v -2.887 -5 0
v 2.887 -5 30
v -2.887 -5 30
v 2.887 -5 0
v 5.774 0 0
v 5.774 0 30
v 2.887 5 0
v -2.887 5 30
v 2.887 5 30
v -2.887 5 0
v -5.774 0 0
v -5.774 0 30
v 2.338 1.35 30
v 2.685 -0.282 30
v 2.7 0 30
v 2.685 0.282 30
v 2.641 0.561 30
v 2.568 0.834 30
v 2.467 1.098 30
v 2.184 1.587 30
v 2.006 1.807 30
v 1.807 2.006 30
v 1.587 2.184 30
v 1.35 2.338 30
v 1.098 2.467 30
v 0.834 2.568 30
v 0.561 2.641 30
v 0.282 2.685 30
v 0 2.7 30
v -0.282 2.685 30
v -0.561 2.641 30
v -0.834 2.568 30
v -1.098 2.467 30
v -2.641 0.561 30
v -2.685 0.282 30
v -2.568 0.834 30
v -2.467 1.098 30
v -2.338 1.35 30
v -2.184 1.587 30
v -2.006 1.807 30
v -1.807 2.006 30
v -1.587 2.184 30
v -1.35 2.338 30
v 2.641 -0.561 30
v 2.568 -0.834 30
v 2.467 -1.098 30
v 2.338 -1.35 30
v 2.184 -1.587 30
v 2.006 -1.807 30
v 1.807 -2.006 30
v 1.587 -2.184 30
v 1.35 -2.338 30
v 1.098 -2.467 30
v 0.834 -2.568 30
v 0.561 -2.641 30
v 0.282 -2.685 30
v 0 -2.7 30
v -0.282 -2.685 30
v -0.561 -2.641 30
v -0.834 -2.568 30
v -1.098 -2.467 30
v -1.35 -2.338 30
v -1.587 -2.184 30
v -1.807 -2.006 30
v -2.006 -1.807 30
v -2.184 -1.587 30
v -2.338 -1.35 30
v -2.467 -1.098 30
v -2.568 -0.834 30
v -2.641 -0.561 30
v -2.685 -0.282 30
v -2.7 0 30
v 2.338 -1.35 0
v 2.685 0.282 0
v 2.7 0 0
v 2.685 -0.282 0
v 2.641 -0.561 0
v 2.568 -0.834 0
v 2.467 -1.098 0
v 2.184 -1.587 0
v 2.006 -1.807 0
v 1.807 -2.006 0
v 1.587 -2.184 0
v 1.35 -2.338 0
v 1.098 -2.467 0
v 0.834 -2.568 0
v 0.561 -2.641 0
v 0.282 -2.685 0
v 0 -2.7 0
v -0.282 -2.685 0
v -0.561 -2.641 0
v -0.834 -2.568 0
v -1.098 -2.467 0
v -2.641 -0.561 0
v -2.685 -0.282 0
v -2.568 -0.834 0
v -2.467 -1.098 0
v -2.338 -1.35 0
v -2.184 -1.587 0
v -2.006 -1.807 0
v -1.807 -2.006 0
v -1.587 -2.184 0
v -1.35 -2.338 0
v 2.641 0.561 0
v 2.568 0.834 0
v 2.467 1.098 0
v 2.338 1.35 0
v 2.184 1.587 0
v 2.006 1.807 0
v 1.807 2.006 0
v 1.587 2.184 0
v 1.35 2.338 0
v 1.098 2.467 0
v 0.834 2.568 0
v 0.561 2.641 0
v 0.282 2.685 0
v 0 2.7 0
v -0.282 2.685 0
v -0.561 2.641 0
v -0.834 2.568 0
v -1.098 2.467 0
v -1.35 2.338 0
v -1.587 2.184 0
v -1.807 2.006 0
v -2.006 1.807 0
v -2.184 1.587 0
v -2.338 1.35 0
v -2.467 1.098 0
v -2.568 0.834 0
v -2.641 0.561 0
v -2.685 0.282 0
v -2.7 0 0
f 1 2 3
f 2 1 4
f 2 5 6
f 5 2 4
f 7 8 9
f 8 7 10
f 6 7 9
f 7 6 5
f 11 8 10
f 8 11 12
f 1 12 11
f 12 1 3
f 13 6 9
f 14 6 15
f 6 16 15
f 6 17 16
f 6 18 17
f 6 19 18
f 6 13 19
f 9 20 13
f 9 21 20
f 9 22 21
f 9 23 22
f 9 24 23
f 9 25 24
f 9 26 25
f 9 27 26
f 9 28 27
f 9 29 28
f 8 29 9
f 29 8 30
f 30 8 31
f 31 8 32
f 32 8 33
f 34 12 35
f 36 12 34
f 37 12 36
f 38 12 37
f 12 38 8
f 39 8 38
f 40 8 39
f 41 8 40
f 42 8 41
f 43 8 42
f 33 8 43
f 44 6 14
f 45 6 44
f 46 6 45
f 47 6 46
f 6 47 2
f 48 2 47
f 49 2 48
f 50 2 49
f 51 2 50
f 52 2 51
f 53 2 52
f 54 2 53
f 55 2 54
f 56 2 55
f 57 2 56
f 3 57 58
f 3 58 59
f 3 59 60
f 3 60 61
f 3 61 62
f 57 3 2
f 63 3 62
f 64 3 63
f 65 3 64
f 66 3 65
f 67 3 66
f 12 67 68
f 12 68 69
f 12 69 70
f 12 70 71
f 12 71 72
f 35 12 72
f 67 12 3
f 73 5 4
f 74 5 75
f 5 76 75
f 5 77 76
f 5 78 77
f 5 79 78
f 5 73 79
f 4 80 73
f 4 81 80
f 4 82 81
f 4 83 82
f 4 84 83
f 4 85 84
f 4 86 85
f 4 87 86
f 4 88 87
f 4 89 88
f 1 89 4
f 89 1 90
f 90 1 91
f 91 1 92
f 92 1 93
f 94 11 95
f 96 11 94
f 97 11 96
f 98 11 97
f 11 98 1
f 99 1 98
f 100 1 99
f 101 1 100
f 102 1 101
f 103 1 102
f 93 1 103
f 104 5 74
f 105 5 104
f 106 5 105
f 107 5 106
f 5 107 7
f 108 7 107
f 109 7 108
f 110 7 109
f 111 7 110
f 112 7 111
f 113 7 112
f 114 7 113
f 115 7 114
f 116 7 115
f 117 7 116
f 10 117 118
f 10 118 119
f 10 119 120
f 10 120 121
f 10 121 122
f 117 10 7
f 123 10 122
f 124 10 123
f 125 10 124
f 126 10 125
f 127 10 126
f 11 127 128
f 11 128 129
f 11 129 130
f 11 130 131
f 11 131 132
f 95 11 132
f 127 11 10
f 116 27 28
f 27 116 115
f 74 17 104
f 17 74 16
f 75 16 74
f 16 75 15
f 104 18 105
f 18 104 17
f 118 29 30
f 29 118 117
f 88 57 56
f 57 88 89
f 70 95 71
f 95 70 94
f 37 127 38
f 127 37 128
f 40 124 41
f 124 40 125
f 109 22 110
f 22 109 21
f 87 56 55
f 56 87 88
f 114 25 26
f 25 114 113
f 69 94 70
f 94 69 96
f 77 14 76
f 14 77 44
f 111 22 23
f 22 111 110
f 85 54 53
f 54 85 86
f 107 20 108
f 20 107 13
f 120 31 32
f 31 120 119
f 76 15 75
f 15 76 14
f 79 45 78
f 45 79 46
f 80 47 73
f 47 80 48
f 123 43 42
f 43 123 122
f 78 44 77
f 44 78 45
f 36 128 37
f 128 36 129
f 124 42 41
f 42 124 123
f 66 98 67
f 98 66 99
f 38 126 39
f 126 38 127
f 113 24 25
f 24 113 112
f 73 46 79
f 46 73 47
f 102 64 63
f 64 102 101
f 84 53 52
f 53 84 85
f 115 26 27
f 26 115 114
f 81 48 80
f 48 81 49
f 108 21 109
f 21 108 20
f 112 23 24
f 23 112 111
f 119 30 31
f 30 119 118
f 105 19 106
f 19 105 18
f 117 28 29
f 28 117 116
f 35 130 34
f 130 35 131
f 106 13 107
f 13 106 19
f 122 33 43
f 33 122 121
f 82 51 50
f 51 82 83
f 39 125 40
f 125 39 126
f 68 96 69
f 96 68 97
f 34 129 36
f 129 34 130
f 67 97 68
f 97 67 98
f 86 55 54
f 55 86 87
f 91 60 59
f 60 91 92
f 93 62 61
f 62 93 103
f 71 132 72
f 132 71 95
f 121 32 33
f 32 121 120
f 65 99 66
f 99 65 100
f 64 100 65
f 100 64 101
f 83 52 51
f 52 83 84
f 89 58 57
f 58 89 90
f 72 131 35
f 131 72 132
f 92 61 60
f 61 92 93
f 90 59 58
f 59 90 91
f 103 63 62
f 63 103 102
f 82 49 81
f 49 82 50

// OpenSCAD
// Hex standoff, 30 mm long.
$fn = 60;
eps = 0.02;
thread_d = 5.4;
flat = 10;
length = 30;
chamfer = 1.2;
difference() {
    union() {
        cylinder(d = flat / cos(30), h = length, $fn = 6);
        cylinder(d1 = flat / cos(30) - 2 * chamfer, d2 = flat / cos(30), h = chamfer, $fn = 6);
        translate([0, 0, length - chamfer]) cylinder(d1 = flat / cos(30), d2 = flat / cos(30) - 2 * chamfer, h = chamfer, $fn = 6);
    }
    translate([0, 0, -eps]) cylinder(d = thread_d, h = length + 2 * eps);
}
